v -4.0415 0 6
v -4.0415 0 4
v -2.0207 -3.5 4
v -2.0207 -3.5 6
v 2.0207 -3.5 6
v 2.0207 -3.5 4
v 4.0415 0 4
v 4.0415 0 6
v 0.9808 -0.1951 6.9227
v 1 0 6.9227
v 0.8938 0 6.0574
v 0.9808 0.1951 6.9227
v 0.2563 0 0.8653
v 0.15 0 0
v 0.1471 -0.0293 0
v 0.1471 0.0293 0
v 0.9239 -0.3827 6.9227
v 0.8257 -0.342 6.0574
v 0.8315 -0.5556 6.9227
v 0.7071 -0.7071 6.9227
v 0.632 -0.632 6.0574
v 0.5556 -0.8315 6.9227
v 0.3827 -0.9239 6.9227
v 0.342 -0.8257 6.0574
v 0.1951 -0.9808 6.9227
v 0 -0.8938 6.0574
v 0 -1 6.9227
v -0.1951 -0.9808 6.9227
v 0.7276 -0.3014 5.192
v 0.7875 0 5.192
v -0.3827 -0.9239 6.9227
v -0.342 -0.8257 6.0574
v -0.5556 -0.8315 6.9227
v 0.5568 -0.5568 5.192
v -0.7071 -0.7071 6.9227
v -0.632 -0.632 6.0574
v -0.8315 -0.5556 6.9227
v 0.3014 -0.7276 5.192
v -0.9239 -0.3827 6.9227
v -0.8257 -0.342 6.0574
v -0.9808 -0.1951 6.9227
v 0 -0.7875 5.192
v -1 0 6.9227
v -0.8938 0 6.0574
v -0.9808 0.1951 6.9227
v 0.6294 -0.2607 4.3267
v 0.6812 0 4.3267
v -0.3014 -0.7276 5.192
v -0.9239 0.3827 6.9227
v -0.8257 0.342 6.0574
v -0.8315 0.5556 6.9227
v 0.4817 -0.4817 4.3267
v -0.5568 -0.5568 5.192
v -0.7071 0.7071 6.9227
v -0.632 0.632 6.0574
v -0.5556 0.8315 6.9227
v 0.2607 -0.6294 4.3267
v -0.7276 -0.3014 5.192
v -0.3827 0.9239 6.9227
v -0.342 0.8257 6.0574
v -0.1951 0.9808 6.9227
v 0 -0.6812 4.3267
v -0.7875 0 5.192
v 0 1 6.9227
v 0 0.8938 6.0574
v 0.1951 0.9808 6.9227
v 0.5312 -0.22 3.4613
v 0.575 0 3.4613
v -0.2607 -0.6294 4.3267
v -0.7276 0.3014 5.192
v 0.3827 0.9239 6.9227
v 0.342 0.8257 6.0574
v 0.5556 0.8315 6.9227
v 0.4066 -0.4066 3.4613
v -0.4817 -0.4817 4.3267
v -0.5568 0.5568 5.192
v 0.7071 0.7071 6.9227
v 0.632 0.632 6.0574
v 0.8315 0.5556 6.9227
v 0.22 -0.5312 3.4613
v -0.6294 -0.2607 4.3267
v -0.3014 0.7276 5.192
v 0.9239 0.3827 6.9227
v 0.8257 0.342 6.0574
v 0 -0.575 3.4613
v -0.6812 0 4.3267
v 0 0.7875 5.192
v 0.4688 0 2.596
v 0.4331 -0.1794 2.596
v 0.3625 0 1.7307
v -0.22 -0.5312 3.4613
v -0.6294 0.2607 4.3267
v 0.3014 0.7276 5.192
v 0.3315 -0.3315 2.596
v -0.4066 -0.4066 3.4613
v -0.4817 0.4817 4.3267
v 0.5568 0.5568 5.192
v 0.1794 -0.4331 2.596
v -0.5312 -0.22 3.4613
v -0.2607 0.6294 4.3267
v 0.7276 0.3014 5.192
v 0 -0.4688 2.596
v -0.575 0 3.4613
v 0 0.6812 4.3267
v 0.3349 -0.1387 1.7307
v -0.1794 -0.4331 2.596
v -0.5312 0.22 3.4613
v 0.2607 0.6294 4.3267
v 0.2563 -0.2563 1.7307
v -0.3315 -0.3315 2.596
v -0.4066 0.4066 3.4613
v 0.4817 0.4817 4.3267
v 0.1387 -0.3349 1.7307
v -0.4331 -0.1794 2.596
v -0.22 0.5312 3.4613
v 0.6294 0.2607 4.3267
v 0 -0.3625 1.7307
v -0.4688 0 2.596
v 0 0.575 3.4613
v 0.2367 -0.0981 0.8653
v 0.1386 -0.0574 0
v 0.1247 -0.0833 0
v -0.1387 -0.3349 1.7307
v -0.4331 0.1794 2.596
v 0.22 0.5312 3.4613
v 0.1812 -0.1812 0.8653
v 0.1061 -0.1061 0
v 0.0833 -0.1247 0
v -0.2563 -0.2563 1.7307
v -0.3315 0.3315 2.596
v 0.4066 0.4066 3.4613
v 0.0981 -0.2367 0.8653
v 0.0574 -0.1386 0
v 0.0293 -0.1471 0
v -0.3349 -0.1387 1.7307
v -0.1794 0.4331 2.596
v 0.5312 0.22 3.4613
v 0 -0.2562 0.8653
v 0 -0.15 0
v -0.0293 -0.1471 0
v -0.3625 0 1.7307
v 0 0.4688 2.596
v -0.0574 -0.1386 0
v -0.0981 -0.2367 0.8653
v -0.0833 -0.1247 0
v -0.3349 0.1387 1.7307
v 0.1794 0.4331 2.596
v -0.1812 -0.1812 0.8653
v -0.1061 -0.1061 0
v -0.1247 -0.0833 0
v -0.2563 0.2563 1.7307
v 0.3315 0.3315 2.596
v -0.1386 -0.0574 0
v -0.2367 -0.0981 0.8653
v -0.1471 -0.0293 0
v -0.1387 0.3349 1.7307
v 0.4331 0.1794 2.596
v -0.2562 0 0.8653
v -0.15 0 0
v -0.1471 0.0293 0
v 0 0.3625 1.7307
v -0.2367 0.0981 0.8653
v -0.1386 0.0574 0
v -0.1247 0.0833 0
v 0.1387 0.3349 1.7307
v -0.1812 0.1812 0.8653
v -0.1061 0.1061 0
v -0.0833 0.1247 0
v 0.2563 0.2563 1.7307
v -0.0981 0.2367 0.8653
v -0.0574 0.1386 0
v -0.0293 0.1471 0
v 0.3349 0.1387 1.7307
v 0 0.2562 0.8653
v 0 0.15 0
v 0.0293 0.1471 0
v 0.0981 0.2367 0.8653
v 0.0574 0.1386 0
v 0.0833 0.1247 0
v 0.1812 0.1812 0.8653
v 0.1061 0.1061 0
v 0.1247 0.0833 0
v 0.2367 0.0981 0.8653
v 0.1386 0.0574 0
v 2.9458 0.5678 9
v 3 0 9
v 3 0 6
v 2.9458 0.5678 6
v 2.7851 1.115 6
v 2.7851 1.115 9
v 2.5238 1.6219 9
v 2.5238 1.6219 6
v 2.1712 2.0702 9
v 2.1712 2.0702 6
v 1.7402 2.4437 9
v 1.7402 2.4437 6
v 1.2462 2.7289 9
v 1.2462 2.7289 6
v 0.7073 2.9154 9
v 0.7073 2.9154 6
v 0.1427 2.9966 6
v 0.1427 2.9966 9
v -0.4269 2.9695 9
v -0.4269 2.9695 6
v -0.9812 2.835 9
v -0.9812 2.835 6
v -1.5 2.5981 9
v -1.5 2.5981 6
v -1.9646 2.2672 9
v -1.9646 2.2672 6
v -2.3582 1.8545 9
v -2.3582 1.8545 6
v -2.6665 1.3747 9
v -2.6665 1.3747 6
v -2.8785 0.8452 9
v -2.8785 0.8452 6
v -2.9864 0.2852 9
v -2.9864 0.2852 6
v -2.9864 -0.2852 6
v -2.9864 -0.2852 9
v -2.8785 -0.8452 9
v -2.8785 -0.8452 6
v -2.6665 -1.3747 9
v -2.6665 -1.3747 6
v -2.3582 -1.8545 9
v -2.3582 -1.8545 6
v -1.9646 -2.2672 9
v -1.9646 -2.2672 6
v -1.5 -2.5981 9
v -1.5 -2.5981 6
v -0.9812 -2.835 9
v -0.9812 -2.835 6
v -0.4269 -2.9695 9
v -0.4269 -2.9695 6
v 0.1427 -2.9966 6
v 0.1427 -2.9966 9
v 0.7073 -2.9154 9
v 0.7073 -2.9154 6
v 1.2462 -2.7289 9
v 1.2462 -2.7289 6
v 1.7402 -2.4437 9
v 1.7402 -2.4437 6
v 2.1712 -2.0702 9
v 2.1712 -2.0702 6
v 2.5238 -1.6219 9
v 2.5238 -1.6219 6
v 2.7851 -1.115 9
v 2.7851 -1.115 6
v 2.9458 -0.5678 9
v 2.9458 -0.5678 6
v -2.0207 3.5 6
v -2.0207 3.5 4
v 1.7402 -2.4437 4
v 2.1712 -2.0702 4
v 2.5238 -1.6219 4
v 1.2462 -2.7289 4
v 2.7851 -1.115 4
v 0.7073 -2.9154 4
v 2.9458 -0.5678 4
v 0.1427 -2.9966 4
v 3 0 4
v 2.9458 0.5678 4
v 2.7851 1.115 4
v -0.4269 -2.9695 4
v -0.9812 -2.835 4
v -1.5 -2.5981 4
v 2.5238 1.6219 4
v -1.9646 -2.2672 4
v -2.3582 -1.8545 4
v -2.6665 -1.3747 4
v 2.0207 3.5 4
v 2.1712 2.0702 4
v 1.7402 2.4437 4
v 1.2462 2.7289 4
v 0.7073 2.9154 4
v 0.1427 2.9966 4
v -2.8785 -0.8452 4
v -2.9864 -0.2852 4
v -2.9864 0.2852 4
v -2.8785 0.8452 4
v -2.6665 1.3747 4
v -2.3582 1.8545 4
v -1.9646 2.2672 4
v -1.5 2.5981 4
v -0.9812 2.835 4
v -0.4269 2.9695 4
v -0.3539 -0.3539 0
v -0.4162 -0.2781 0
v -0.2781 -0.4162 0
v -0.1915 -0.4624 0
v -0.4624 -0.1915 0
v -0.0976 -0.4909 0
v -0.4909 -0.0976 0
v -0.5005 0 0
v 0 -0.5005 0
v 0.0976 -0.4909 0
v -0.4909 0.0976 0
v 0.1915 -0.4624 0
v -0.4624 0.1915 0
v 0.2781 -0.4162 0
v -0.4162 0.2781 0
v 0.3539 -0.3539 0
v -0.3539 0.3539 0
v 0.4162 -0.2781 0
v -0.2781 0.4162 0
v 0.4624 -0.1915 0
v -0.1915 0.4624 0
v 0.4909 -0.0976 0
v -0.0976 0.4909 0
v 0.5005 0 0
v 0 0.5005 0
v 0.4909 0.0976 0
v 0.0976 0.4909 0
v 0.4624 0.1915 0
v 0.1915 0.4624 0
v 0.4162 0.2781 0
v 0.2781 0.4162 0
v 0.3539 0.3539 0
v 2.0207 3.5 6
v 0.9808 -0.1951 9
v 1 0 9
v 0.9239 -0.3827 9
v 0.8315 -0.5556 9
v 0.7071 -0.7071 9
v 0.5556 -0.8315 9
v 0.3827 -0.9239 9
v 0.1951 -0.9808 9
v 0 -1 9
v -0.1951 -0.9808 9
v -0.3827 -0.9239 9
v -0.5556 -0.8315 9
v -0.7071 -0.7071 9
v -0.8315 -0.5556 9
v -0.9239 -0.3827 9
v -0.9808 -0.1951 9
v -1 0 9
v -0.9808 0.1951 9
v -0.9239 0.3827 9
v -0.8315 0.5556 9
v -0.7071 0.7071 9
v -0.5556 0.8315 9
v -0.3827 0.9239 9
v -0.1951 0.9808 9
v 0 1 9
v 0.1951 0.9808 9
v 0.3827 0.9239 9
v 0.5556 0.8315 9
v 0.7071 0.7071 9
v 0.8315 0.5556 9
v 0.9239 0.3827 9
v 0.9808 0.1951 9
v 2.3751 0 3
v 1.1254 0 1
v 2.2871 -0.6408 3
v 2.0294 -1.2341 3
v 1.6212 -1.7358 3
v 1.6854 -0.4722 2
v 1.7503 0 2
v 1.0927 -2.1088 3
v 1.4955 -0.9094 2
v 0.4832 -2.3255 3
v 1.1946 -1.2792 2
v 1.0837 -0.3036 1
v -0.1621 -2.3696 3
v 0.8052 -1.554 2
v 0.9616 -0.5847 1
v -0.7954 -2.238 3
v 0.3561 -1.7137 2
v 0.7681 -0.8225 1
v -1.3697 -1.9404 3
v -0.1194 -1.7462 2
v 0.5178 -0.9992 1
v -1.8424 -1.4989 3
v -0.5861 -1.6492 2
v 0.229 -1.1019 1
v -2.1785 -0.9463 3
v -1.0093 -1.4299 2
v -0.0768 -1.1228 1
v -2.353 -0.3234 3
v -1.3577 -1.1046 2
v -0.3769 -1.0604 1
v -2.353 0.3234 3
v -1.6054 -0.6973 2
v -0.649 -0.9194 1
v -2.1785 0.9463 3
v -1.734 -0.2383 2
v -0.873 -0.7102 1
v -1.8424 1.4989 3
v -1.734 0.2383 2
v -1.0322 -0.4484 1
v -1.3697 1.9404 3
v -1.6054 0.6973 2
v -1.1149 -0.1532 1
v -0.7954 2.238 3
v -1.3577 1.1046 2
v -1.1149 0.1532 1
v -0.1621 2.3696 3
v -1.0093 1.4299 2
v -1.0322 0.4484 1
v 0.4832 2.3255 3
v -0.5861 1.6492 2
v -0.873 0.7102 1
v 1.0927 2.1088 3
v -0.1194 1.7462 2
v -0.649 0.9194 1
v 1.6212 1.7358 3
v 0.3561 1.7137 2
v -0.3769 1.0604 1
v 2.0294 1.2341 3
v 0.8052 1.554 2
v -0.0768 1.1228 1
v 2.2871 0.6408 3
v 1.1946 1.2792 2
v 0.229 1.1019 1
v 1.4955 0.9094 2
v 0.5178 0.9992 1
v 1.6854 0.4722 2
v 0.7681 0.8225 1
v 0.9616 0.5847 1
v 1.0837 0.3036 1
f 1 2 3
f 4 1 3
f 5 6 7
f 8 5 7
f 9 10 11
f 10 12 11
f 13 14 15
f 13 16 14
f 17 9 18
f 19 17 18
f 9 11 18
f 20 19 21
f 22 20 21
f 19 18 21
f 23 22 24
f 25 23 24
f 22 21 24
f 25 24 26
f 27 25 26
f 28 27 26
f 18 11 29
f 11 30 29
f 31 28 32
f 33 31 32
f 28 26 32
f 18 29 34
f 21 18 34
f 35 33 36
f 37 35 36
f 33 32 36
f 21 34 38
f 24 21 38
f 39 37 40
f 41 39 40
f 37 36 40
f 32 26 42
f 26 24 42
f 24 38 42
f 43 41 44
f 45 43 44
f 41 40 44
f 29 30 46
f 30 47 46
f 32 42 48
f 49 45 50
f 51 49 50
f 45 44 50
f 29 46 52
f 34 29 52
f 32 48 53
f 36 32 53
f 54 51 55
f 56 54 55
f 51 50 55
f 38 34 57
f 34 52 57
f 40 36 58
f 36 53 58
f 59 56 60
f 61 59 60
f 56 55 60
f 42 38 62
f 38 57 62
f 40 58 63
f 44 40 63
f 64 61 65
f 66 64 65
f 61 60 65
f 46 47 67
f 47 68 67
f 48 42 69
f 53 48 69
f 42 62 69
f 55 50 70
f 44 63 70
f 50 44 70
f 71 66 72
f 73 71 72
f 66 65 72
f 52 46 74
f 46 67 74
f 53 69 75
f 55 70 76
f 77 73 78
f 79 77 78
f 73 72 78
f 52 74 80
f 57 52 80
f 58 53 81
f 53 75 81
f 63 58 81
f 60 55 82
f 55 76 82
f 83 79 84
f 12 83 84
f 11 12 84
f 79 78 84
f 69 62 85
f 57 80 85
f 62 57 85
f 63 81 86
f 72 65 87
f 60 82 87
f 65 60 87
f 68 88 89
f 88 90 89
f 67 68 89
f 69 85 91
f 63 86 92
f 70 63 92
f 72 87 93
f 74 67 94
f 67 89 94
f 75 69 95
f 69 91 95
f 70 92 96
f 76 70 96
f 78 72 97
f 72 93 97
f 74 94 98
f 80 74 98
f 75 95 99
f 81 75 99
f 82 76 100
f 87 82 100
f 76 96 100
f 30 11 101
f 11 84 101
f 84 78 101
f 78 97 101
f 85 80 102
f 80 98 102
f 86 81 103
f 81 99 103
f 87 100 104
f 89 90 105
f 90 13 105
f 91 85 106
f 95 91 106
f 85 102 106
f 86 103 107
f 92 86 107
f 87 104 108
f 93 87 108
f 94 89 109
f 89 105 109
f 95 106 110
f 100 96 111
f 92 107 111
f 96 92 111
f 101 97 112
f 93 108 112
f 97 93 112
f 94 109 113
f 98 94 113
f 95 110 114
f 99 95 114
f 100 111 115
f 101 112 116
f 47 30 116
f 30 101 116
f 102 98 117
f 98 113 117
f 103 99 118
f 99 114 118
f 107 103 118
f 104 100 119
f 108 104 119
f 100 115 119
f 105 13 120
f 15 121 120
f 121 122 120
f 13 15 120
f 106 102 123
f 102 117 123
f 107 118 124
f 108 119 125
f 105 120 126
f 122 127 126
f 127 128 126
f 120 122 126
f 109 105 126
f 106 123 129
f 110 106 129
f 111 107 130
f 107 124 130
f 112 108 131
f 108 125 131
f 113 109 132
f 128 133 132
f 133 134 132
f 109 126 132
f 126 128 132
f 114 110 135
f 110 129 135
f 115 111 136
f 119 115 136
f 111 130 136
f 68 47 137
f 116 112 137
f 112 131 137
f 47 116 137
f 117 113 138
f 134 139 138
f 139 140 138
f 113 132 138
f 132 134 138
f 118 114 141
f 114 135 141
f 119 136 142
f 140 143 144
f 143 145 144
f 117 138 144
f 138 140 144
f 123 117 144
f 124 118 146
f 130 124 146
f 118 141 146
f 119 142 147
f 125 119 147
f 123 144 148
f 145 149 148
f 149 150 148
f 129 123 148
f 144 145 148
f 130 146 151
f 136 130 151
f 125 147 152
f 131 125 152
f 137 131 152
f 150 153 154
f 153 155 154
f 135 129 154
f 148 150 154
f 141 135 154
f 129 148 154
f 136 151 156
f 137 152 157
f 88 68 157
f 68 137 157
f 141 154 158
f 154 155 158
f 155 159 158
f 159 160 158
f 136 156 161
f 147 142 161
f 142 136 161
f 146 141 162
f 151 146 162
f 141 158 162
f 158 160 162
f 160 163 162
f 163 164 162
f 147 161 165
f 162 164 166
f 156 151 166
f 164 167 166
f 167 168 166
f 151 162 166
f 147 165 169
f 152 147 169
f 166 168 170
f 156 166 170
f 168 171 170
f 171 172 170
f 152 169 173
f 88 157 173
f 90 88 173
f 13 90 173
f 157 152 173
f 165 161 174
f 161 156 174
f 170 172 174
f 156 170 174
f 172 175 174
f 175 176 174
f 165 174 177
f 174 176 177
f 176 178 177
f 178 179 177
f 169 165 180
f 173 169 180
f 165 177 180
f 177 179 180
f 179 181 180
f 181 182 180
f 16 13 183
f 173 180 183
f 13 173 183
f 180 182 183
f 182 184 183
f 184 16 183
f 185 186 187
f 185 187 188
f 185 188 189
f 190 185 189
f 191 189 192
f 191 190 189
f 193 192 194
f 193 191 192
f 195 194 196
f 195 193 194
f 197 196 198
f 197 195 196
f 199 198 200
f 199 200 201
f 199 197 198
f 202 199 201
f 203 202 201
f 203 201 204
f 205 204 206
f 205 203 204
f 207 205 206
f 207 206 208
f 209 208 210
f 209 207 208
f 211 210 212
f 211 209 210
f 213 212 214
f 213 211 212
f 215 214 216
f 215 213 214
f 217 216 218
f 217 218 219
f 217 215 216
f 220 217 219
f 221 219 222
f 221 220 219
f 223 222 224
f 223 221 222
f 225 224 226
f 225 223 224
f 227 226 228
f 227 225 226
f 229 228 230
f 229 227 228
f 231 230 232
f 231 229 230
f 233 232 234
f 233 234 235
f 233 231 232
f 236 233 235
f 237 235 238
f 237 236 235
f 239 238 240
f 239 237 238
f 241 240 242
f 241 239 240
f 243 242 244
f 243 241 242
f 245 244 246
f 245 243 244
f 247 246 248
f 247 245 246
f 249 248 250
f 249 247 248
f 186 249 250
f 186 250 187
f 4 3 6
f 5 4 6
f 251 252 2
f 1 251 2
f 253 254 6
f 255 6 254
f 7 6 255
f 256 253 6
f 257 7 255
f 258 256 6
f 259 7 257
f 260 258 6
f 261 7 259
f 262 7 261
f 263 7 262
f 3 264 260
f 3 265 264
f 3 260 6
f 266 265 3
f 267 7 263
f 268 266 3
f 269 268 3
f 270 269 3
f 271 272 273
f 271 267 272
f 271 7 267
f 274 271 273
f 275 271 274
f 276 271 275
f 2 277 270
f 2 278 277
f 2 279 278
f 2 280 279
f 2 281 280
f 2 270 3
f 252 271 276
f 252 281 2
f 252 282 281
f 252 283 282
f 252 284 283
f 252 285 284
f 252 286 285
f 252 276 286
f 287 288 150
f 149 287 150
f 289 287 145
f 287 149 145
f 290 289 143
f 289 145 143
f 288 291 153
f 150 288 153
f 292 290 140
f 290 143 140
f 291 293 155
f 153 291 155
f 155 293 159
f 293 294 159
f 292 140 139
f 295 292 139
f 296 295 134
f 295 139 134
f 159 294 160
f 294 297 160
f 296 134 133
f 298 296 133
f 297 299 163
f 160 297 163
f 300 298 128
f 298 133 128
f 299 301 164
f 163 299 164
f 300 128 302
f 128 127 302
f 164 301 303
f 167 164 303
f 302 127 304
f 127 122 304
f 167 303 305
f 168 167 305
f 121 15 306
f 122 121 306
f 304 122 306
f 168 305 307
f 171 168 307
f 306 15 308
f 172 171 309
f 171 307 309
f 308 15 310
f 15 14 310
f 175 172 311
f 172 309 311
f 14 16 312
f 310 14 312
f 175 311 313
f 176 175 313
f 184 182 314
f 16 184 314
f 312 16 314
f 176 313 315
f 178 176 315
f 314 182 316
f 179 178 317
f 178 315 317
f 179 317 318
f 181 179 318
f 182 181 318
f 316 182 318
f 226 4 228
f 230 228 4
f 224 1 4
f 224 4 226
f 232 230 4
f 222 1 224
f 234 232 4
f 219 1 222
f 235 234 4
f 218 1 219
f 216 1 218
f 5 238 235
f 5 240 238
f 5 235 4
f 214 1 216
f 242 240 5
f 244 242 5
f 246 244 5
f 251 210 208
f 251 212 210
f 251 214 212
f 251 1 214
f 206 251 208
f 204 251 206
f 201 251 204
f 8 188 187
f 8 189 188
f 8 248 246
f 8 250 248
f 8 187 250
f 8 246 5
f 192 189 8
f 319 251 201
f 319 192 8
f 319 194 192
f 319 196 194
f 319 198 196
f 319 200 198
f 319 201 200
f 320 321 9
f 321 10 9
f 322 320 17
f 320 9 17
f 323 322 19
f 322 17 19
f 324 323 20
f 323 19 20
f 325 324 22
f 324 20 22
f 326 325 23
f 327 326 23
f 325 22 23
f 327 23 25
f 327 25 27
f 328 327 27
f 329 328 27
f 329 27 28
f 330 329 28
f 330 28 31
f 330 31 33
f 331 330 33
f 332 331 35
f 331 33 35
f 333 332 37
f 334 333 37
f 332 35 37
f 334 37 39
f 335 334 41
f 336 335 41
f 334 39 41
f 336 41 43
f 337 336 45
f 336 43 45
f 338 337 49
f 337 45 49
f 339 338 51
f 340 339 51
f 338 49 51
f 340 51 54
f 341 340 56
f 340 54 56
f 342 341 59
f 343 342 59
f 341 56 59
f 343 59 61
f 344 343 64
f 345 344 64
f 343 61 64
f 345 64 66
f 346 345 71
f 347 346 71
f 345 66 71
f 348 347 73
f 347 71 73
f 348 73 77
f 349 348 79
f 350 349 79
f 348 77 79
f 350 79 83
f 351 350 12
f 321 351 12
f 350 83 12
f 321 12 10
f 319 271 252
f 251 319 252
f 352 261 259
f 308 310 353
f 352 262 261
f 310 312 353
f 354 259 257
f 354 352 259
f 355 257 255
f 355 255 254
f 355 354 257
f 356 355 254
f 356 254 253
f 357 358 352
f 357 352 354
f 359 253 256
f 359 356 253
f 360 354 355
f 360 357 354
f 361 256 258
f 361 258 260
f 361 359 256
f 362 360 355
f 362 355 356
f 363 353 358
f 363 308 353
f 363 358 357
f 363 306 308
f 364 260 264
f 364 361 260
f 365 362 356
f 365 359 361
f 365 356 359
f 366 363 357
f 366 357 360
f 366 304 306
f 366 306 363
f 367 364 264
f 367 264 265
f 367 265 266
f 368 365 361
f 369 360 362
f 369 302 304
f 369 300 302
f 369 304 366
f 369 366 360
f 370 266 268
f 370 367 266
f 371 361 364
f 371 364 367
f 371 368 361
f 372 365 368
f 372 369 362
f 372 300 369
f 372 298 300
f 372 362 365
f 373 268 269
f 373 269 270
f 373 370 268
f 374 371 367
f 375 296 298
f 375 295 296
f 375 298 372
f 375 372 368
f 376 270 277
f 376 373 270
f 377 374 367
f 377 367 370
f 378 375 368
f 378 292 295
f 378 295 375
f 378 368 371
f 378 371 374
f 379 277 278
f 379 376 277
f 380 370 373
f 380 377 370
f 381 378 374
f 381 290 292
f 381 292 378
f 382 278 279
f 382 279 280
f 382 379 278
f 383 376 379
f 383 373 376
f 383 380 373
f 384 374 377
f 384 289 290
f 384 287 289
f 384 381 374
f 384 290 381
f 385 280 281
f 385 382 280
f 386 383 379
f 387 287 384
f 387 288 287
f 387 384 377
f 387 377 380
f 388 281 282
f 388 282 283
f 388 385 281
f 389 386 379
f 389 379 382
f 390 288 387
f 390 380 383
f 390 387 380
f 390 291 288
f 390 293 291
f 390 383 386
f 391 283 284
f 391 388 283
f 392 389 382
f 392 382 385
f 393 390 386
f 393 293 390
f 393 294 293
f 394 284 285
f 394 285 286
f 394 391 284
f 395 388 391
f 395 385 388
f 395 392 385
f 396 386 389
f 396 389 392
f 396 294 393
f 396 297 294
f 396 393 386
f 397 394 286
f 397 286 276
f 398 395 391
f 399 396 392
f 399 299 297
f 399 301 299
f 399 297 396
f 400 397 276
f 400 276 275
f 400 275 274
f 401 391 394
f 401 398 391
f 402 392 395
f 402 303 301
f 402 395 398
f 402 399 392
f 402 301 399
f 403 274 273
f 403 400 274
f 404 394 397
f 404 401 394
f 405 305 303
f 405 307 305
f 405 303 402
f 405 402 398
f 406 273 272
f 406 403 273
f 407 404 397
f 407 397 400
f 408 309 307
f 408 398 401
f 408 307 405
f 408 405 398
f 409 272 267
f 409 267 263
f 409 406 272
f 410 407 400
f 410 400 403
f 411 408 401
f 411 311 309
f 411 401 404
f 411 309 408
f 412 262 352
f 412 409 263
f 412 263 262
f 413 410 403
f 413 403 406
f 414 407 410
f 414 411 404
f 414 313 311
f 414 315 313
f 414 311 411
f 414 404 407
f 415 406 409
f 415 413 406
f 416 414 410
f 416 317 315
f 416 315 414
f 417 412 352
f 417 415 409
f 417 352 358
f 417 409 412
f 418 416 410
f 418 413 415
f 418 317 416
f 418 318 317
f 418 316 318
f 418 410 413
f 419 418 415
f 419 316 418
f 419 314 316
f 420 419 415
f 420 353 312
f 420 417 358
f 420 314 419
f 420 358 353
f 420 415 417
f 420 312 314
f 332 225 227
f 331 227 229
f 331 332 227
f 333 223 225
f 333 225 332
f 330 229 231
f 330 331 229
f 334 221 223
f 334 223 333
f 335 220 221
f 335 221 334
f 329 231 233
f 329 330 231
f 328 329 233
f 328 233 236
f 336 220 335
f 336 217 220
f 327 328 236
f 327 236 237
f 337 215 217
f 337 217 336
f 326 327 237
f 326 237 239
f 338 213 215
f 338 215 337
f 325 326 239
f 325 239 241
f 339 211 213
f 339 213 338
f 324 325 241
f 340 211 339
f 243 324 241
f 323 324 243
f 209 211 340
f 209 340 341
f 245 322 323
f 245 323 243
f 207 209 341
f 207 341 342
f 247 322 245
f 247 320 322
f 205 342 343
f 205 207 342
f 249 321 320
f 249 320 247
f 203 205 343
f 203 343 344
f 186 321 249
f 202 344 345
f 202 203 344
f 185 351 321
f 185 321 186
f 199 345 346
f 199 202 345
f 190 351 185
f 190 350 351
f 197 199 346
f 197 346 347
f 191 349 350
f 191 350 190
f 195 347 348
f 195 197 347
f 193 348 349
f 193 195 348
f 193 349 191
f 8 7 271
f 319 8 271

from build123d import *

# Parameters (mm, degrees)
BOSS_EXTRU_1_DEPTH      = 9
ESQUISSE2_W             = 19.623971562
ESQUISSE2_H             = 15.534154535
ESQUISSE2_R             = 3
ENL_V_MAT_EXTRU_1_DEPTH = 3
ENL_V_START             = -4
ESQUISSE3_W             = 11.267201257
ESQUISSE3_H             = 13.961169169
ESQUISSE3_R             = 3
ENL_V_MAT_EXTRU_2_DEPTH = 4
CHANFREIN1_SIZE         = 4
CHANFREIN1_SIZE_2       = 2.499477408


with BuildPart() as part:
    # Esquisse1 → Boss.-Extru.1 (new body)
    with BuildSketch(Plane.XY):
        Polygon((4.041451884, 0), (2.020725942, 3.5), (-2.020725942, 3.5), (-4.041451884, 0), (-2.020725942, -3.5), (2.020725942, -3.5), align=None)
    extrude(amount=BOSS_EXTRU_1_DEPTH)

    # Esquisse2 → Enlèv. mat.-Extru.1 (cut)
    with BuildSketch(Plane.XY.offset(9)):
        with Locations((0.327116653, -1.544441398)):
            Rectangle(ESQUISSE2_W, ESQUISSE2_H)
        Circle(ESQUISSE2_R, mode=Mode.SUBTRACT)
    extrude(amount=-ENL_V_MAT_EXTRU_1_DEPTH, mode=Mode.SUBTRACT)

    # Esquisse3 → Enlèv. mat.-Extru.2 (cut)
    with BuildSketch(Plane(origin=(0, 0, 0), x_dir=(-1, 0, 0), z_dir=(0, 0, -1)).offset(ENL_V_START)):
        with Locations((0.009770186, 0.039262349)):
            Rectangle(ESQUISSE3_W, ESQUISSE3_H)
        with Locations(Location((0, 0, 0), (0, 0, 180))):
            Circle(ESQUISSE3_R, mode=Mode.SUBTRACT)
    extrude(amount=ENL_V_MAT_EXTRU_2_DEPTH, mode=Mode.SUBTRACT)

    # Chanfrein1
    # the kernel refuses this chamfer: 4, 2.499477408 mm, written as the material it takes off along each edge
    with BuildSketch(Plane(origin=(0, 0, 0), x_dir=(1, 0, 0), z_dir=(0, 1, 0))) as chanfrein1_piece_1_section:
        Polygon((3, -CHANFREIN1_SIZE), (3 - CHANFREIN1_SIZE_2, 0), (3, 0), align=None)
    chanfrein1_piece_1 = revolve(axis=Axis((0, 0, 0), (0, 0, -1)), mode=Mode.PRIVATE)
    chanfrein1_piece_1 = split(chanfrein1_piece_1, bisect_by=Plane(origin=(-1.744026904, 0, 4), z_dir=(0, 0, -1)), keep=Keep.TOP, mode=Mode.PRIVATE)
    add(chanfrein1_piece_1, mode=Mode.SUBTRACT)

    # Esquisse4 → Enlèvement de matière-Révolution1 (revolve, cut)
    with BuildSketch(Plane(origin=(0, 0, 0), x_dir=(1, 0, 0), z_dir=(0, 1, 0))):
        Polygon((0, -9), (1, -9), (1, -6.922694464), (0.15, 0), (0, 0), align=None)
    revolve(axis=Axis((0, 0, 10.381605157), (0, 0, -1)), mode=Mode.SUBTRACT)


solid = part.part
